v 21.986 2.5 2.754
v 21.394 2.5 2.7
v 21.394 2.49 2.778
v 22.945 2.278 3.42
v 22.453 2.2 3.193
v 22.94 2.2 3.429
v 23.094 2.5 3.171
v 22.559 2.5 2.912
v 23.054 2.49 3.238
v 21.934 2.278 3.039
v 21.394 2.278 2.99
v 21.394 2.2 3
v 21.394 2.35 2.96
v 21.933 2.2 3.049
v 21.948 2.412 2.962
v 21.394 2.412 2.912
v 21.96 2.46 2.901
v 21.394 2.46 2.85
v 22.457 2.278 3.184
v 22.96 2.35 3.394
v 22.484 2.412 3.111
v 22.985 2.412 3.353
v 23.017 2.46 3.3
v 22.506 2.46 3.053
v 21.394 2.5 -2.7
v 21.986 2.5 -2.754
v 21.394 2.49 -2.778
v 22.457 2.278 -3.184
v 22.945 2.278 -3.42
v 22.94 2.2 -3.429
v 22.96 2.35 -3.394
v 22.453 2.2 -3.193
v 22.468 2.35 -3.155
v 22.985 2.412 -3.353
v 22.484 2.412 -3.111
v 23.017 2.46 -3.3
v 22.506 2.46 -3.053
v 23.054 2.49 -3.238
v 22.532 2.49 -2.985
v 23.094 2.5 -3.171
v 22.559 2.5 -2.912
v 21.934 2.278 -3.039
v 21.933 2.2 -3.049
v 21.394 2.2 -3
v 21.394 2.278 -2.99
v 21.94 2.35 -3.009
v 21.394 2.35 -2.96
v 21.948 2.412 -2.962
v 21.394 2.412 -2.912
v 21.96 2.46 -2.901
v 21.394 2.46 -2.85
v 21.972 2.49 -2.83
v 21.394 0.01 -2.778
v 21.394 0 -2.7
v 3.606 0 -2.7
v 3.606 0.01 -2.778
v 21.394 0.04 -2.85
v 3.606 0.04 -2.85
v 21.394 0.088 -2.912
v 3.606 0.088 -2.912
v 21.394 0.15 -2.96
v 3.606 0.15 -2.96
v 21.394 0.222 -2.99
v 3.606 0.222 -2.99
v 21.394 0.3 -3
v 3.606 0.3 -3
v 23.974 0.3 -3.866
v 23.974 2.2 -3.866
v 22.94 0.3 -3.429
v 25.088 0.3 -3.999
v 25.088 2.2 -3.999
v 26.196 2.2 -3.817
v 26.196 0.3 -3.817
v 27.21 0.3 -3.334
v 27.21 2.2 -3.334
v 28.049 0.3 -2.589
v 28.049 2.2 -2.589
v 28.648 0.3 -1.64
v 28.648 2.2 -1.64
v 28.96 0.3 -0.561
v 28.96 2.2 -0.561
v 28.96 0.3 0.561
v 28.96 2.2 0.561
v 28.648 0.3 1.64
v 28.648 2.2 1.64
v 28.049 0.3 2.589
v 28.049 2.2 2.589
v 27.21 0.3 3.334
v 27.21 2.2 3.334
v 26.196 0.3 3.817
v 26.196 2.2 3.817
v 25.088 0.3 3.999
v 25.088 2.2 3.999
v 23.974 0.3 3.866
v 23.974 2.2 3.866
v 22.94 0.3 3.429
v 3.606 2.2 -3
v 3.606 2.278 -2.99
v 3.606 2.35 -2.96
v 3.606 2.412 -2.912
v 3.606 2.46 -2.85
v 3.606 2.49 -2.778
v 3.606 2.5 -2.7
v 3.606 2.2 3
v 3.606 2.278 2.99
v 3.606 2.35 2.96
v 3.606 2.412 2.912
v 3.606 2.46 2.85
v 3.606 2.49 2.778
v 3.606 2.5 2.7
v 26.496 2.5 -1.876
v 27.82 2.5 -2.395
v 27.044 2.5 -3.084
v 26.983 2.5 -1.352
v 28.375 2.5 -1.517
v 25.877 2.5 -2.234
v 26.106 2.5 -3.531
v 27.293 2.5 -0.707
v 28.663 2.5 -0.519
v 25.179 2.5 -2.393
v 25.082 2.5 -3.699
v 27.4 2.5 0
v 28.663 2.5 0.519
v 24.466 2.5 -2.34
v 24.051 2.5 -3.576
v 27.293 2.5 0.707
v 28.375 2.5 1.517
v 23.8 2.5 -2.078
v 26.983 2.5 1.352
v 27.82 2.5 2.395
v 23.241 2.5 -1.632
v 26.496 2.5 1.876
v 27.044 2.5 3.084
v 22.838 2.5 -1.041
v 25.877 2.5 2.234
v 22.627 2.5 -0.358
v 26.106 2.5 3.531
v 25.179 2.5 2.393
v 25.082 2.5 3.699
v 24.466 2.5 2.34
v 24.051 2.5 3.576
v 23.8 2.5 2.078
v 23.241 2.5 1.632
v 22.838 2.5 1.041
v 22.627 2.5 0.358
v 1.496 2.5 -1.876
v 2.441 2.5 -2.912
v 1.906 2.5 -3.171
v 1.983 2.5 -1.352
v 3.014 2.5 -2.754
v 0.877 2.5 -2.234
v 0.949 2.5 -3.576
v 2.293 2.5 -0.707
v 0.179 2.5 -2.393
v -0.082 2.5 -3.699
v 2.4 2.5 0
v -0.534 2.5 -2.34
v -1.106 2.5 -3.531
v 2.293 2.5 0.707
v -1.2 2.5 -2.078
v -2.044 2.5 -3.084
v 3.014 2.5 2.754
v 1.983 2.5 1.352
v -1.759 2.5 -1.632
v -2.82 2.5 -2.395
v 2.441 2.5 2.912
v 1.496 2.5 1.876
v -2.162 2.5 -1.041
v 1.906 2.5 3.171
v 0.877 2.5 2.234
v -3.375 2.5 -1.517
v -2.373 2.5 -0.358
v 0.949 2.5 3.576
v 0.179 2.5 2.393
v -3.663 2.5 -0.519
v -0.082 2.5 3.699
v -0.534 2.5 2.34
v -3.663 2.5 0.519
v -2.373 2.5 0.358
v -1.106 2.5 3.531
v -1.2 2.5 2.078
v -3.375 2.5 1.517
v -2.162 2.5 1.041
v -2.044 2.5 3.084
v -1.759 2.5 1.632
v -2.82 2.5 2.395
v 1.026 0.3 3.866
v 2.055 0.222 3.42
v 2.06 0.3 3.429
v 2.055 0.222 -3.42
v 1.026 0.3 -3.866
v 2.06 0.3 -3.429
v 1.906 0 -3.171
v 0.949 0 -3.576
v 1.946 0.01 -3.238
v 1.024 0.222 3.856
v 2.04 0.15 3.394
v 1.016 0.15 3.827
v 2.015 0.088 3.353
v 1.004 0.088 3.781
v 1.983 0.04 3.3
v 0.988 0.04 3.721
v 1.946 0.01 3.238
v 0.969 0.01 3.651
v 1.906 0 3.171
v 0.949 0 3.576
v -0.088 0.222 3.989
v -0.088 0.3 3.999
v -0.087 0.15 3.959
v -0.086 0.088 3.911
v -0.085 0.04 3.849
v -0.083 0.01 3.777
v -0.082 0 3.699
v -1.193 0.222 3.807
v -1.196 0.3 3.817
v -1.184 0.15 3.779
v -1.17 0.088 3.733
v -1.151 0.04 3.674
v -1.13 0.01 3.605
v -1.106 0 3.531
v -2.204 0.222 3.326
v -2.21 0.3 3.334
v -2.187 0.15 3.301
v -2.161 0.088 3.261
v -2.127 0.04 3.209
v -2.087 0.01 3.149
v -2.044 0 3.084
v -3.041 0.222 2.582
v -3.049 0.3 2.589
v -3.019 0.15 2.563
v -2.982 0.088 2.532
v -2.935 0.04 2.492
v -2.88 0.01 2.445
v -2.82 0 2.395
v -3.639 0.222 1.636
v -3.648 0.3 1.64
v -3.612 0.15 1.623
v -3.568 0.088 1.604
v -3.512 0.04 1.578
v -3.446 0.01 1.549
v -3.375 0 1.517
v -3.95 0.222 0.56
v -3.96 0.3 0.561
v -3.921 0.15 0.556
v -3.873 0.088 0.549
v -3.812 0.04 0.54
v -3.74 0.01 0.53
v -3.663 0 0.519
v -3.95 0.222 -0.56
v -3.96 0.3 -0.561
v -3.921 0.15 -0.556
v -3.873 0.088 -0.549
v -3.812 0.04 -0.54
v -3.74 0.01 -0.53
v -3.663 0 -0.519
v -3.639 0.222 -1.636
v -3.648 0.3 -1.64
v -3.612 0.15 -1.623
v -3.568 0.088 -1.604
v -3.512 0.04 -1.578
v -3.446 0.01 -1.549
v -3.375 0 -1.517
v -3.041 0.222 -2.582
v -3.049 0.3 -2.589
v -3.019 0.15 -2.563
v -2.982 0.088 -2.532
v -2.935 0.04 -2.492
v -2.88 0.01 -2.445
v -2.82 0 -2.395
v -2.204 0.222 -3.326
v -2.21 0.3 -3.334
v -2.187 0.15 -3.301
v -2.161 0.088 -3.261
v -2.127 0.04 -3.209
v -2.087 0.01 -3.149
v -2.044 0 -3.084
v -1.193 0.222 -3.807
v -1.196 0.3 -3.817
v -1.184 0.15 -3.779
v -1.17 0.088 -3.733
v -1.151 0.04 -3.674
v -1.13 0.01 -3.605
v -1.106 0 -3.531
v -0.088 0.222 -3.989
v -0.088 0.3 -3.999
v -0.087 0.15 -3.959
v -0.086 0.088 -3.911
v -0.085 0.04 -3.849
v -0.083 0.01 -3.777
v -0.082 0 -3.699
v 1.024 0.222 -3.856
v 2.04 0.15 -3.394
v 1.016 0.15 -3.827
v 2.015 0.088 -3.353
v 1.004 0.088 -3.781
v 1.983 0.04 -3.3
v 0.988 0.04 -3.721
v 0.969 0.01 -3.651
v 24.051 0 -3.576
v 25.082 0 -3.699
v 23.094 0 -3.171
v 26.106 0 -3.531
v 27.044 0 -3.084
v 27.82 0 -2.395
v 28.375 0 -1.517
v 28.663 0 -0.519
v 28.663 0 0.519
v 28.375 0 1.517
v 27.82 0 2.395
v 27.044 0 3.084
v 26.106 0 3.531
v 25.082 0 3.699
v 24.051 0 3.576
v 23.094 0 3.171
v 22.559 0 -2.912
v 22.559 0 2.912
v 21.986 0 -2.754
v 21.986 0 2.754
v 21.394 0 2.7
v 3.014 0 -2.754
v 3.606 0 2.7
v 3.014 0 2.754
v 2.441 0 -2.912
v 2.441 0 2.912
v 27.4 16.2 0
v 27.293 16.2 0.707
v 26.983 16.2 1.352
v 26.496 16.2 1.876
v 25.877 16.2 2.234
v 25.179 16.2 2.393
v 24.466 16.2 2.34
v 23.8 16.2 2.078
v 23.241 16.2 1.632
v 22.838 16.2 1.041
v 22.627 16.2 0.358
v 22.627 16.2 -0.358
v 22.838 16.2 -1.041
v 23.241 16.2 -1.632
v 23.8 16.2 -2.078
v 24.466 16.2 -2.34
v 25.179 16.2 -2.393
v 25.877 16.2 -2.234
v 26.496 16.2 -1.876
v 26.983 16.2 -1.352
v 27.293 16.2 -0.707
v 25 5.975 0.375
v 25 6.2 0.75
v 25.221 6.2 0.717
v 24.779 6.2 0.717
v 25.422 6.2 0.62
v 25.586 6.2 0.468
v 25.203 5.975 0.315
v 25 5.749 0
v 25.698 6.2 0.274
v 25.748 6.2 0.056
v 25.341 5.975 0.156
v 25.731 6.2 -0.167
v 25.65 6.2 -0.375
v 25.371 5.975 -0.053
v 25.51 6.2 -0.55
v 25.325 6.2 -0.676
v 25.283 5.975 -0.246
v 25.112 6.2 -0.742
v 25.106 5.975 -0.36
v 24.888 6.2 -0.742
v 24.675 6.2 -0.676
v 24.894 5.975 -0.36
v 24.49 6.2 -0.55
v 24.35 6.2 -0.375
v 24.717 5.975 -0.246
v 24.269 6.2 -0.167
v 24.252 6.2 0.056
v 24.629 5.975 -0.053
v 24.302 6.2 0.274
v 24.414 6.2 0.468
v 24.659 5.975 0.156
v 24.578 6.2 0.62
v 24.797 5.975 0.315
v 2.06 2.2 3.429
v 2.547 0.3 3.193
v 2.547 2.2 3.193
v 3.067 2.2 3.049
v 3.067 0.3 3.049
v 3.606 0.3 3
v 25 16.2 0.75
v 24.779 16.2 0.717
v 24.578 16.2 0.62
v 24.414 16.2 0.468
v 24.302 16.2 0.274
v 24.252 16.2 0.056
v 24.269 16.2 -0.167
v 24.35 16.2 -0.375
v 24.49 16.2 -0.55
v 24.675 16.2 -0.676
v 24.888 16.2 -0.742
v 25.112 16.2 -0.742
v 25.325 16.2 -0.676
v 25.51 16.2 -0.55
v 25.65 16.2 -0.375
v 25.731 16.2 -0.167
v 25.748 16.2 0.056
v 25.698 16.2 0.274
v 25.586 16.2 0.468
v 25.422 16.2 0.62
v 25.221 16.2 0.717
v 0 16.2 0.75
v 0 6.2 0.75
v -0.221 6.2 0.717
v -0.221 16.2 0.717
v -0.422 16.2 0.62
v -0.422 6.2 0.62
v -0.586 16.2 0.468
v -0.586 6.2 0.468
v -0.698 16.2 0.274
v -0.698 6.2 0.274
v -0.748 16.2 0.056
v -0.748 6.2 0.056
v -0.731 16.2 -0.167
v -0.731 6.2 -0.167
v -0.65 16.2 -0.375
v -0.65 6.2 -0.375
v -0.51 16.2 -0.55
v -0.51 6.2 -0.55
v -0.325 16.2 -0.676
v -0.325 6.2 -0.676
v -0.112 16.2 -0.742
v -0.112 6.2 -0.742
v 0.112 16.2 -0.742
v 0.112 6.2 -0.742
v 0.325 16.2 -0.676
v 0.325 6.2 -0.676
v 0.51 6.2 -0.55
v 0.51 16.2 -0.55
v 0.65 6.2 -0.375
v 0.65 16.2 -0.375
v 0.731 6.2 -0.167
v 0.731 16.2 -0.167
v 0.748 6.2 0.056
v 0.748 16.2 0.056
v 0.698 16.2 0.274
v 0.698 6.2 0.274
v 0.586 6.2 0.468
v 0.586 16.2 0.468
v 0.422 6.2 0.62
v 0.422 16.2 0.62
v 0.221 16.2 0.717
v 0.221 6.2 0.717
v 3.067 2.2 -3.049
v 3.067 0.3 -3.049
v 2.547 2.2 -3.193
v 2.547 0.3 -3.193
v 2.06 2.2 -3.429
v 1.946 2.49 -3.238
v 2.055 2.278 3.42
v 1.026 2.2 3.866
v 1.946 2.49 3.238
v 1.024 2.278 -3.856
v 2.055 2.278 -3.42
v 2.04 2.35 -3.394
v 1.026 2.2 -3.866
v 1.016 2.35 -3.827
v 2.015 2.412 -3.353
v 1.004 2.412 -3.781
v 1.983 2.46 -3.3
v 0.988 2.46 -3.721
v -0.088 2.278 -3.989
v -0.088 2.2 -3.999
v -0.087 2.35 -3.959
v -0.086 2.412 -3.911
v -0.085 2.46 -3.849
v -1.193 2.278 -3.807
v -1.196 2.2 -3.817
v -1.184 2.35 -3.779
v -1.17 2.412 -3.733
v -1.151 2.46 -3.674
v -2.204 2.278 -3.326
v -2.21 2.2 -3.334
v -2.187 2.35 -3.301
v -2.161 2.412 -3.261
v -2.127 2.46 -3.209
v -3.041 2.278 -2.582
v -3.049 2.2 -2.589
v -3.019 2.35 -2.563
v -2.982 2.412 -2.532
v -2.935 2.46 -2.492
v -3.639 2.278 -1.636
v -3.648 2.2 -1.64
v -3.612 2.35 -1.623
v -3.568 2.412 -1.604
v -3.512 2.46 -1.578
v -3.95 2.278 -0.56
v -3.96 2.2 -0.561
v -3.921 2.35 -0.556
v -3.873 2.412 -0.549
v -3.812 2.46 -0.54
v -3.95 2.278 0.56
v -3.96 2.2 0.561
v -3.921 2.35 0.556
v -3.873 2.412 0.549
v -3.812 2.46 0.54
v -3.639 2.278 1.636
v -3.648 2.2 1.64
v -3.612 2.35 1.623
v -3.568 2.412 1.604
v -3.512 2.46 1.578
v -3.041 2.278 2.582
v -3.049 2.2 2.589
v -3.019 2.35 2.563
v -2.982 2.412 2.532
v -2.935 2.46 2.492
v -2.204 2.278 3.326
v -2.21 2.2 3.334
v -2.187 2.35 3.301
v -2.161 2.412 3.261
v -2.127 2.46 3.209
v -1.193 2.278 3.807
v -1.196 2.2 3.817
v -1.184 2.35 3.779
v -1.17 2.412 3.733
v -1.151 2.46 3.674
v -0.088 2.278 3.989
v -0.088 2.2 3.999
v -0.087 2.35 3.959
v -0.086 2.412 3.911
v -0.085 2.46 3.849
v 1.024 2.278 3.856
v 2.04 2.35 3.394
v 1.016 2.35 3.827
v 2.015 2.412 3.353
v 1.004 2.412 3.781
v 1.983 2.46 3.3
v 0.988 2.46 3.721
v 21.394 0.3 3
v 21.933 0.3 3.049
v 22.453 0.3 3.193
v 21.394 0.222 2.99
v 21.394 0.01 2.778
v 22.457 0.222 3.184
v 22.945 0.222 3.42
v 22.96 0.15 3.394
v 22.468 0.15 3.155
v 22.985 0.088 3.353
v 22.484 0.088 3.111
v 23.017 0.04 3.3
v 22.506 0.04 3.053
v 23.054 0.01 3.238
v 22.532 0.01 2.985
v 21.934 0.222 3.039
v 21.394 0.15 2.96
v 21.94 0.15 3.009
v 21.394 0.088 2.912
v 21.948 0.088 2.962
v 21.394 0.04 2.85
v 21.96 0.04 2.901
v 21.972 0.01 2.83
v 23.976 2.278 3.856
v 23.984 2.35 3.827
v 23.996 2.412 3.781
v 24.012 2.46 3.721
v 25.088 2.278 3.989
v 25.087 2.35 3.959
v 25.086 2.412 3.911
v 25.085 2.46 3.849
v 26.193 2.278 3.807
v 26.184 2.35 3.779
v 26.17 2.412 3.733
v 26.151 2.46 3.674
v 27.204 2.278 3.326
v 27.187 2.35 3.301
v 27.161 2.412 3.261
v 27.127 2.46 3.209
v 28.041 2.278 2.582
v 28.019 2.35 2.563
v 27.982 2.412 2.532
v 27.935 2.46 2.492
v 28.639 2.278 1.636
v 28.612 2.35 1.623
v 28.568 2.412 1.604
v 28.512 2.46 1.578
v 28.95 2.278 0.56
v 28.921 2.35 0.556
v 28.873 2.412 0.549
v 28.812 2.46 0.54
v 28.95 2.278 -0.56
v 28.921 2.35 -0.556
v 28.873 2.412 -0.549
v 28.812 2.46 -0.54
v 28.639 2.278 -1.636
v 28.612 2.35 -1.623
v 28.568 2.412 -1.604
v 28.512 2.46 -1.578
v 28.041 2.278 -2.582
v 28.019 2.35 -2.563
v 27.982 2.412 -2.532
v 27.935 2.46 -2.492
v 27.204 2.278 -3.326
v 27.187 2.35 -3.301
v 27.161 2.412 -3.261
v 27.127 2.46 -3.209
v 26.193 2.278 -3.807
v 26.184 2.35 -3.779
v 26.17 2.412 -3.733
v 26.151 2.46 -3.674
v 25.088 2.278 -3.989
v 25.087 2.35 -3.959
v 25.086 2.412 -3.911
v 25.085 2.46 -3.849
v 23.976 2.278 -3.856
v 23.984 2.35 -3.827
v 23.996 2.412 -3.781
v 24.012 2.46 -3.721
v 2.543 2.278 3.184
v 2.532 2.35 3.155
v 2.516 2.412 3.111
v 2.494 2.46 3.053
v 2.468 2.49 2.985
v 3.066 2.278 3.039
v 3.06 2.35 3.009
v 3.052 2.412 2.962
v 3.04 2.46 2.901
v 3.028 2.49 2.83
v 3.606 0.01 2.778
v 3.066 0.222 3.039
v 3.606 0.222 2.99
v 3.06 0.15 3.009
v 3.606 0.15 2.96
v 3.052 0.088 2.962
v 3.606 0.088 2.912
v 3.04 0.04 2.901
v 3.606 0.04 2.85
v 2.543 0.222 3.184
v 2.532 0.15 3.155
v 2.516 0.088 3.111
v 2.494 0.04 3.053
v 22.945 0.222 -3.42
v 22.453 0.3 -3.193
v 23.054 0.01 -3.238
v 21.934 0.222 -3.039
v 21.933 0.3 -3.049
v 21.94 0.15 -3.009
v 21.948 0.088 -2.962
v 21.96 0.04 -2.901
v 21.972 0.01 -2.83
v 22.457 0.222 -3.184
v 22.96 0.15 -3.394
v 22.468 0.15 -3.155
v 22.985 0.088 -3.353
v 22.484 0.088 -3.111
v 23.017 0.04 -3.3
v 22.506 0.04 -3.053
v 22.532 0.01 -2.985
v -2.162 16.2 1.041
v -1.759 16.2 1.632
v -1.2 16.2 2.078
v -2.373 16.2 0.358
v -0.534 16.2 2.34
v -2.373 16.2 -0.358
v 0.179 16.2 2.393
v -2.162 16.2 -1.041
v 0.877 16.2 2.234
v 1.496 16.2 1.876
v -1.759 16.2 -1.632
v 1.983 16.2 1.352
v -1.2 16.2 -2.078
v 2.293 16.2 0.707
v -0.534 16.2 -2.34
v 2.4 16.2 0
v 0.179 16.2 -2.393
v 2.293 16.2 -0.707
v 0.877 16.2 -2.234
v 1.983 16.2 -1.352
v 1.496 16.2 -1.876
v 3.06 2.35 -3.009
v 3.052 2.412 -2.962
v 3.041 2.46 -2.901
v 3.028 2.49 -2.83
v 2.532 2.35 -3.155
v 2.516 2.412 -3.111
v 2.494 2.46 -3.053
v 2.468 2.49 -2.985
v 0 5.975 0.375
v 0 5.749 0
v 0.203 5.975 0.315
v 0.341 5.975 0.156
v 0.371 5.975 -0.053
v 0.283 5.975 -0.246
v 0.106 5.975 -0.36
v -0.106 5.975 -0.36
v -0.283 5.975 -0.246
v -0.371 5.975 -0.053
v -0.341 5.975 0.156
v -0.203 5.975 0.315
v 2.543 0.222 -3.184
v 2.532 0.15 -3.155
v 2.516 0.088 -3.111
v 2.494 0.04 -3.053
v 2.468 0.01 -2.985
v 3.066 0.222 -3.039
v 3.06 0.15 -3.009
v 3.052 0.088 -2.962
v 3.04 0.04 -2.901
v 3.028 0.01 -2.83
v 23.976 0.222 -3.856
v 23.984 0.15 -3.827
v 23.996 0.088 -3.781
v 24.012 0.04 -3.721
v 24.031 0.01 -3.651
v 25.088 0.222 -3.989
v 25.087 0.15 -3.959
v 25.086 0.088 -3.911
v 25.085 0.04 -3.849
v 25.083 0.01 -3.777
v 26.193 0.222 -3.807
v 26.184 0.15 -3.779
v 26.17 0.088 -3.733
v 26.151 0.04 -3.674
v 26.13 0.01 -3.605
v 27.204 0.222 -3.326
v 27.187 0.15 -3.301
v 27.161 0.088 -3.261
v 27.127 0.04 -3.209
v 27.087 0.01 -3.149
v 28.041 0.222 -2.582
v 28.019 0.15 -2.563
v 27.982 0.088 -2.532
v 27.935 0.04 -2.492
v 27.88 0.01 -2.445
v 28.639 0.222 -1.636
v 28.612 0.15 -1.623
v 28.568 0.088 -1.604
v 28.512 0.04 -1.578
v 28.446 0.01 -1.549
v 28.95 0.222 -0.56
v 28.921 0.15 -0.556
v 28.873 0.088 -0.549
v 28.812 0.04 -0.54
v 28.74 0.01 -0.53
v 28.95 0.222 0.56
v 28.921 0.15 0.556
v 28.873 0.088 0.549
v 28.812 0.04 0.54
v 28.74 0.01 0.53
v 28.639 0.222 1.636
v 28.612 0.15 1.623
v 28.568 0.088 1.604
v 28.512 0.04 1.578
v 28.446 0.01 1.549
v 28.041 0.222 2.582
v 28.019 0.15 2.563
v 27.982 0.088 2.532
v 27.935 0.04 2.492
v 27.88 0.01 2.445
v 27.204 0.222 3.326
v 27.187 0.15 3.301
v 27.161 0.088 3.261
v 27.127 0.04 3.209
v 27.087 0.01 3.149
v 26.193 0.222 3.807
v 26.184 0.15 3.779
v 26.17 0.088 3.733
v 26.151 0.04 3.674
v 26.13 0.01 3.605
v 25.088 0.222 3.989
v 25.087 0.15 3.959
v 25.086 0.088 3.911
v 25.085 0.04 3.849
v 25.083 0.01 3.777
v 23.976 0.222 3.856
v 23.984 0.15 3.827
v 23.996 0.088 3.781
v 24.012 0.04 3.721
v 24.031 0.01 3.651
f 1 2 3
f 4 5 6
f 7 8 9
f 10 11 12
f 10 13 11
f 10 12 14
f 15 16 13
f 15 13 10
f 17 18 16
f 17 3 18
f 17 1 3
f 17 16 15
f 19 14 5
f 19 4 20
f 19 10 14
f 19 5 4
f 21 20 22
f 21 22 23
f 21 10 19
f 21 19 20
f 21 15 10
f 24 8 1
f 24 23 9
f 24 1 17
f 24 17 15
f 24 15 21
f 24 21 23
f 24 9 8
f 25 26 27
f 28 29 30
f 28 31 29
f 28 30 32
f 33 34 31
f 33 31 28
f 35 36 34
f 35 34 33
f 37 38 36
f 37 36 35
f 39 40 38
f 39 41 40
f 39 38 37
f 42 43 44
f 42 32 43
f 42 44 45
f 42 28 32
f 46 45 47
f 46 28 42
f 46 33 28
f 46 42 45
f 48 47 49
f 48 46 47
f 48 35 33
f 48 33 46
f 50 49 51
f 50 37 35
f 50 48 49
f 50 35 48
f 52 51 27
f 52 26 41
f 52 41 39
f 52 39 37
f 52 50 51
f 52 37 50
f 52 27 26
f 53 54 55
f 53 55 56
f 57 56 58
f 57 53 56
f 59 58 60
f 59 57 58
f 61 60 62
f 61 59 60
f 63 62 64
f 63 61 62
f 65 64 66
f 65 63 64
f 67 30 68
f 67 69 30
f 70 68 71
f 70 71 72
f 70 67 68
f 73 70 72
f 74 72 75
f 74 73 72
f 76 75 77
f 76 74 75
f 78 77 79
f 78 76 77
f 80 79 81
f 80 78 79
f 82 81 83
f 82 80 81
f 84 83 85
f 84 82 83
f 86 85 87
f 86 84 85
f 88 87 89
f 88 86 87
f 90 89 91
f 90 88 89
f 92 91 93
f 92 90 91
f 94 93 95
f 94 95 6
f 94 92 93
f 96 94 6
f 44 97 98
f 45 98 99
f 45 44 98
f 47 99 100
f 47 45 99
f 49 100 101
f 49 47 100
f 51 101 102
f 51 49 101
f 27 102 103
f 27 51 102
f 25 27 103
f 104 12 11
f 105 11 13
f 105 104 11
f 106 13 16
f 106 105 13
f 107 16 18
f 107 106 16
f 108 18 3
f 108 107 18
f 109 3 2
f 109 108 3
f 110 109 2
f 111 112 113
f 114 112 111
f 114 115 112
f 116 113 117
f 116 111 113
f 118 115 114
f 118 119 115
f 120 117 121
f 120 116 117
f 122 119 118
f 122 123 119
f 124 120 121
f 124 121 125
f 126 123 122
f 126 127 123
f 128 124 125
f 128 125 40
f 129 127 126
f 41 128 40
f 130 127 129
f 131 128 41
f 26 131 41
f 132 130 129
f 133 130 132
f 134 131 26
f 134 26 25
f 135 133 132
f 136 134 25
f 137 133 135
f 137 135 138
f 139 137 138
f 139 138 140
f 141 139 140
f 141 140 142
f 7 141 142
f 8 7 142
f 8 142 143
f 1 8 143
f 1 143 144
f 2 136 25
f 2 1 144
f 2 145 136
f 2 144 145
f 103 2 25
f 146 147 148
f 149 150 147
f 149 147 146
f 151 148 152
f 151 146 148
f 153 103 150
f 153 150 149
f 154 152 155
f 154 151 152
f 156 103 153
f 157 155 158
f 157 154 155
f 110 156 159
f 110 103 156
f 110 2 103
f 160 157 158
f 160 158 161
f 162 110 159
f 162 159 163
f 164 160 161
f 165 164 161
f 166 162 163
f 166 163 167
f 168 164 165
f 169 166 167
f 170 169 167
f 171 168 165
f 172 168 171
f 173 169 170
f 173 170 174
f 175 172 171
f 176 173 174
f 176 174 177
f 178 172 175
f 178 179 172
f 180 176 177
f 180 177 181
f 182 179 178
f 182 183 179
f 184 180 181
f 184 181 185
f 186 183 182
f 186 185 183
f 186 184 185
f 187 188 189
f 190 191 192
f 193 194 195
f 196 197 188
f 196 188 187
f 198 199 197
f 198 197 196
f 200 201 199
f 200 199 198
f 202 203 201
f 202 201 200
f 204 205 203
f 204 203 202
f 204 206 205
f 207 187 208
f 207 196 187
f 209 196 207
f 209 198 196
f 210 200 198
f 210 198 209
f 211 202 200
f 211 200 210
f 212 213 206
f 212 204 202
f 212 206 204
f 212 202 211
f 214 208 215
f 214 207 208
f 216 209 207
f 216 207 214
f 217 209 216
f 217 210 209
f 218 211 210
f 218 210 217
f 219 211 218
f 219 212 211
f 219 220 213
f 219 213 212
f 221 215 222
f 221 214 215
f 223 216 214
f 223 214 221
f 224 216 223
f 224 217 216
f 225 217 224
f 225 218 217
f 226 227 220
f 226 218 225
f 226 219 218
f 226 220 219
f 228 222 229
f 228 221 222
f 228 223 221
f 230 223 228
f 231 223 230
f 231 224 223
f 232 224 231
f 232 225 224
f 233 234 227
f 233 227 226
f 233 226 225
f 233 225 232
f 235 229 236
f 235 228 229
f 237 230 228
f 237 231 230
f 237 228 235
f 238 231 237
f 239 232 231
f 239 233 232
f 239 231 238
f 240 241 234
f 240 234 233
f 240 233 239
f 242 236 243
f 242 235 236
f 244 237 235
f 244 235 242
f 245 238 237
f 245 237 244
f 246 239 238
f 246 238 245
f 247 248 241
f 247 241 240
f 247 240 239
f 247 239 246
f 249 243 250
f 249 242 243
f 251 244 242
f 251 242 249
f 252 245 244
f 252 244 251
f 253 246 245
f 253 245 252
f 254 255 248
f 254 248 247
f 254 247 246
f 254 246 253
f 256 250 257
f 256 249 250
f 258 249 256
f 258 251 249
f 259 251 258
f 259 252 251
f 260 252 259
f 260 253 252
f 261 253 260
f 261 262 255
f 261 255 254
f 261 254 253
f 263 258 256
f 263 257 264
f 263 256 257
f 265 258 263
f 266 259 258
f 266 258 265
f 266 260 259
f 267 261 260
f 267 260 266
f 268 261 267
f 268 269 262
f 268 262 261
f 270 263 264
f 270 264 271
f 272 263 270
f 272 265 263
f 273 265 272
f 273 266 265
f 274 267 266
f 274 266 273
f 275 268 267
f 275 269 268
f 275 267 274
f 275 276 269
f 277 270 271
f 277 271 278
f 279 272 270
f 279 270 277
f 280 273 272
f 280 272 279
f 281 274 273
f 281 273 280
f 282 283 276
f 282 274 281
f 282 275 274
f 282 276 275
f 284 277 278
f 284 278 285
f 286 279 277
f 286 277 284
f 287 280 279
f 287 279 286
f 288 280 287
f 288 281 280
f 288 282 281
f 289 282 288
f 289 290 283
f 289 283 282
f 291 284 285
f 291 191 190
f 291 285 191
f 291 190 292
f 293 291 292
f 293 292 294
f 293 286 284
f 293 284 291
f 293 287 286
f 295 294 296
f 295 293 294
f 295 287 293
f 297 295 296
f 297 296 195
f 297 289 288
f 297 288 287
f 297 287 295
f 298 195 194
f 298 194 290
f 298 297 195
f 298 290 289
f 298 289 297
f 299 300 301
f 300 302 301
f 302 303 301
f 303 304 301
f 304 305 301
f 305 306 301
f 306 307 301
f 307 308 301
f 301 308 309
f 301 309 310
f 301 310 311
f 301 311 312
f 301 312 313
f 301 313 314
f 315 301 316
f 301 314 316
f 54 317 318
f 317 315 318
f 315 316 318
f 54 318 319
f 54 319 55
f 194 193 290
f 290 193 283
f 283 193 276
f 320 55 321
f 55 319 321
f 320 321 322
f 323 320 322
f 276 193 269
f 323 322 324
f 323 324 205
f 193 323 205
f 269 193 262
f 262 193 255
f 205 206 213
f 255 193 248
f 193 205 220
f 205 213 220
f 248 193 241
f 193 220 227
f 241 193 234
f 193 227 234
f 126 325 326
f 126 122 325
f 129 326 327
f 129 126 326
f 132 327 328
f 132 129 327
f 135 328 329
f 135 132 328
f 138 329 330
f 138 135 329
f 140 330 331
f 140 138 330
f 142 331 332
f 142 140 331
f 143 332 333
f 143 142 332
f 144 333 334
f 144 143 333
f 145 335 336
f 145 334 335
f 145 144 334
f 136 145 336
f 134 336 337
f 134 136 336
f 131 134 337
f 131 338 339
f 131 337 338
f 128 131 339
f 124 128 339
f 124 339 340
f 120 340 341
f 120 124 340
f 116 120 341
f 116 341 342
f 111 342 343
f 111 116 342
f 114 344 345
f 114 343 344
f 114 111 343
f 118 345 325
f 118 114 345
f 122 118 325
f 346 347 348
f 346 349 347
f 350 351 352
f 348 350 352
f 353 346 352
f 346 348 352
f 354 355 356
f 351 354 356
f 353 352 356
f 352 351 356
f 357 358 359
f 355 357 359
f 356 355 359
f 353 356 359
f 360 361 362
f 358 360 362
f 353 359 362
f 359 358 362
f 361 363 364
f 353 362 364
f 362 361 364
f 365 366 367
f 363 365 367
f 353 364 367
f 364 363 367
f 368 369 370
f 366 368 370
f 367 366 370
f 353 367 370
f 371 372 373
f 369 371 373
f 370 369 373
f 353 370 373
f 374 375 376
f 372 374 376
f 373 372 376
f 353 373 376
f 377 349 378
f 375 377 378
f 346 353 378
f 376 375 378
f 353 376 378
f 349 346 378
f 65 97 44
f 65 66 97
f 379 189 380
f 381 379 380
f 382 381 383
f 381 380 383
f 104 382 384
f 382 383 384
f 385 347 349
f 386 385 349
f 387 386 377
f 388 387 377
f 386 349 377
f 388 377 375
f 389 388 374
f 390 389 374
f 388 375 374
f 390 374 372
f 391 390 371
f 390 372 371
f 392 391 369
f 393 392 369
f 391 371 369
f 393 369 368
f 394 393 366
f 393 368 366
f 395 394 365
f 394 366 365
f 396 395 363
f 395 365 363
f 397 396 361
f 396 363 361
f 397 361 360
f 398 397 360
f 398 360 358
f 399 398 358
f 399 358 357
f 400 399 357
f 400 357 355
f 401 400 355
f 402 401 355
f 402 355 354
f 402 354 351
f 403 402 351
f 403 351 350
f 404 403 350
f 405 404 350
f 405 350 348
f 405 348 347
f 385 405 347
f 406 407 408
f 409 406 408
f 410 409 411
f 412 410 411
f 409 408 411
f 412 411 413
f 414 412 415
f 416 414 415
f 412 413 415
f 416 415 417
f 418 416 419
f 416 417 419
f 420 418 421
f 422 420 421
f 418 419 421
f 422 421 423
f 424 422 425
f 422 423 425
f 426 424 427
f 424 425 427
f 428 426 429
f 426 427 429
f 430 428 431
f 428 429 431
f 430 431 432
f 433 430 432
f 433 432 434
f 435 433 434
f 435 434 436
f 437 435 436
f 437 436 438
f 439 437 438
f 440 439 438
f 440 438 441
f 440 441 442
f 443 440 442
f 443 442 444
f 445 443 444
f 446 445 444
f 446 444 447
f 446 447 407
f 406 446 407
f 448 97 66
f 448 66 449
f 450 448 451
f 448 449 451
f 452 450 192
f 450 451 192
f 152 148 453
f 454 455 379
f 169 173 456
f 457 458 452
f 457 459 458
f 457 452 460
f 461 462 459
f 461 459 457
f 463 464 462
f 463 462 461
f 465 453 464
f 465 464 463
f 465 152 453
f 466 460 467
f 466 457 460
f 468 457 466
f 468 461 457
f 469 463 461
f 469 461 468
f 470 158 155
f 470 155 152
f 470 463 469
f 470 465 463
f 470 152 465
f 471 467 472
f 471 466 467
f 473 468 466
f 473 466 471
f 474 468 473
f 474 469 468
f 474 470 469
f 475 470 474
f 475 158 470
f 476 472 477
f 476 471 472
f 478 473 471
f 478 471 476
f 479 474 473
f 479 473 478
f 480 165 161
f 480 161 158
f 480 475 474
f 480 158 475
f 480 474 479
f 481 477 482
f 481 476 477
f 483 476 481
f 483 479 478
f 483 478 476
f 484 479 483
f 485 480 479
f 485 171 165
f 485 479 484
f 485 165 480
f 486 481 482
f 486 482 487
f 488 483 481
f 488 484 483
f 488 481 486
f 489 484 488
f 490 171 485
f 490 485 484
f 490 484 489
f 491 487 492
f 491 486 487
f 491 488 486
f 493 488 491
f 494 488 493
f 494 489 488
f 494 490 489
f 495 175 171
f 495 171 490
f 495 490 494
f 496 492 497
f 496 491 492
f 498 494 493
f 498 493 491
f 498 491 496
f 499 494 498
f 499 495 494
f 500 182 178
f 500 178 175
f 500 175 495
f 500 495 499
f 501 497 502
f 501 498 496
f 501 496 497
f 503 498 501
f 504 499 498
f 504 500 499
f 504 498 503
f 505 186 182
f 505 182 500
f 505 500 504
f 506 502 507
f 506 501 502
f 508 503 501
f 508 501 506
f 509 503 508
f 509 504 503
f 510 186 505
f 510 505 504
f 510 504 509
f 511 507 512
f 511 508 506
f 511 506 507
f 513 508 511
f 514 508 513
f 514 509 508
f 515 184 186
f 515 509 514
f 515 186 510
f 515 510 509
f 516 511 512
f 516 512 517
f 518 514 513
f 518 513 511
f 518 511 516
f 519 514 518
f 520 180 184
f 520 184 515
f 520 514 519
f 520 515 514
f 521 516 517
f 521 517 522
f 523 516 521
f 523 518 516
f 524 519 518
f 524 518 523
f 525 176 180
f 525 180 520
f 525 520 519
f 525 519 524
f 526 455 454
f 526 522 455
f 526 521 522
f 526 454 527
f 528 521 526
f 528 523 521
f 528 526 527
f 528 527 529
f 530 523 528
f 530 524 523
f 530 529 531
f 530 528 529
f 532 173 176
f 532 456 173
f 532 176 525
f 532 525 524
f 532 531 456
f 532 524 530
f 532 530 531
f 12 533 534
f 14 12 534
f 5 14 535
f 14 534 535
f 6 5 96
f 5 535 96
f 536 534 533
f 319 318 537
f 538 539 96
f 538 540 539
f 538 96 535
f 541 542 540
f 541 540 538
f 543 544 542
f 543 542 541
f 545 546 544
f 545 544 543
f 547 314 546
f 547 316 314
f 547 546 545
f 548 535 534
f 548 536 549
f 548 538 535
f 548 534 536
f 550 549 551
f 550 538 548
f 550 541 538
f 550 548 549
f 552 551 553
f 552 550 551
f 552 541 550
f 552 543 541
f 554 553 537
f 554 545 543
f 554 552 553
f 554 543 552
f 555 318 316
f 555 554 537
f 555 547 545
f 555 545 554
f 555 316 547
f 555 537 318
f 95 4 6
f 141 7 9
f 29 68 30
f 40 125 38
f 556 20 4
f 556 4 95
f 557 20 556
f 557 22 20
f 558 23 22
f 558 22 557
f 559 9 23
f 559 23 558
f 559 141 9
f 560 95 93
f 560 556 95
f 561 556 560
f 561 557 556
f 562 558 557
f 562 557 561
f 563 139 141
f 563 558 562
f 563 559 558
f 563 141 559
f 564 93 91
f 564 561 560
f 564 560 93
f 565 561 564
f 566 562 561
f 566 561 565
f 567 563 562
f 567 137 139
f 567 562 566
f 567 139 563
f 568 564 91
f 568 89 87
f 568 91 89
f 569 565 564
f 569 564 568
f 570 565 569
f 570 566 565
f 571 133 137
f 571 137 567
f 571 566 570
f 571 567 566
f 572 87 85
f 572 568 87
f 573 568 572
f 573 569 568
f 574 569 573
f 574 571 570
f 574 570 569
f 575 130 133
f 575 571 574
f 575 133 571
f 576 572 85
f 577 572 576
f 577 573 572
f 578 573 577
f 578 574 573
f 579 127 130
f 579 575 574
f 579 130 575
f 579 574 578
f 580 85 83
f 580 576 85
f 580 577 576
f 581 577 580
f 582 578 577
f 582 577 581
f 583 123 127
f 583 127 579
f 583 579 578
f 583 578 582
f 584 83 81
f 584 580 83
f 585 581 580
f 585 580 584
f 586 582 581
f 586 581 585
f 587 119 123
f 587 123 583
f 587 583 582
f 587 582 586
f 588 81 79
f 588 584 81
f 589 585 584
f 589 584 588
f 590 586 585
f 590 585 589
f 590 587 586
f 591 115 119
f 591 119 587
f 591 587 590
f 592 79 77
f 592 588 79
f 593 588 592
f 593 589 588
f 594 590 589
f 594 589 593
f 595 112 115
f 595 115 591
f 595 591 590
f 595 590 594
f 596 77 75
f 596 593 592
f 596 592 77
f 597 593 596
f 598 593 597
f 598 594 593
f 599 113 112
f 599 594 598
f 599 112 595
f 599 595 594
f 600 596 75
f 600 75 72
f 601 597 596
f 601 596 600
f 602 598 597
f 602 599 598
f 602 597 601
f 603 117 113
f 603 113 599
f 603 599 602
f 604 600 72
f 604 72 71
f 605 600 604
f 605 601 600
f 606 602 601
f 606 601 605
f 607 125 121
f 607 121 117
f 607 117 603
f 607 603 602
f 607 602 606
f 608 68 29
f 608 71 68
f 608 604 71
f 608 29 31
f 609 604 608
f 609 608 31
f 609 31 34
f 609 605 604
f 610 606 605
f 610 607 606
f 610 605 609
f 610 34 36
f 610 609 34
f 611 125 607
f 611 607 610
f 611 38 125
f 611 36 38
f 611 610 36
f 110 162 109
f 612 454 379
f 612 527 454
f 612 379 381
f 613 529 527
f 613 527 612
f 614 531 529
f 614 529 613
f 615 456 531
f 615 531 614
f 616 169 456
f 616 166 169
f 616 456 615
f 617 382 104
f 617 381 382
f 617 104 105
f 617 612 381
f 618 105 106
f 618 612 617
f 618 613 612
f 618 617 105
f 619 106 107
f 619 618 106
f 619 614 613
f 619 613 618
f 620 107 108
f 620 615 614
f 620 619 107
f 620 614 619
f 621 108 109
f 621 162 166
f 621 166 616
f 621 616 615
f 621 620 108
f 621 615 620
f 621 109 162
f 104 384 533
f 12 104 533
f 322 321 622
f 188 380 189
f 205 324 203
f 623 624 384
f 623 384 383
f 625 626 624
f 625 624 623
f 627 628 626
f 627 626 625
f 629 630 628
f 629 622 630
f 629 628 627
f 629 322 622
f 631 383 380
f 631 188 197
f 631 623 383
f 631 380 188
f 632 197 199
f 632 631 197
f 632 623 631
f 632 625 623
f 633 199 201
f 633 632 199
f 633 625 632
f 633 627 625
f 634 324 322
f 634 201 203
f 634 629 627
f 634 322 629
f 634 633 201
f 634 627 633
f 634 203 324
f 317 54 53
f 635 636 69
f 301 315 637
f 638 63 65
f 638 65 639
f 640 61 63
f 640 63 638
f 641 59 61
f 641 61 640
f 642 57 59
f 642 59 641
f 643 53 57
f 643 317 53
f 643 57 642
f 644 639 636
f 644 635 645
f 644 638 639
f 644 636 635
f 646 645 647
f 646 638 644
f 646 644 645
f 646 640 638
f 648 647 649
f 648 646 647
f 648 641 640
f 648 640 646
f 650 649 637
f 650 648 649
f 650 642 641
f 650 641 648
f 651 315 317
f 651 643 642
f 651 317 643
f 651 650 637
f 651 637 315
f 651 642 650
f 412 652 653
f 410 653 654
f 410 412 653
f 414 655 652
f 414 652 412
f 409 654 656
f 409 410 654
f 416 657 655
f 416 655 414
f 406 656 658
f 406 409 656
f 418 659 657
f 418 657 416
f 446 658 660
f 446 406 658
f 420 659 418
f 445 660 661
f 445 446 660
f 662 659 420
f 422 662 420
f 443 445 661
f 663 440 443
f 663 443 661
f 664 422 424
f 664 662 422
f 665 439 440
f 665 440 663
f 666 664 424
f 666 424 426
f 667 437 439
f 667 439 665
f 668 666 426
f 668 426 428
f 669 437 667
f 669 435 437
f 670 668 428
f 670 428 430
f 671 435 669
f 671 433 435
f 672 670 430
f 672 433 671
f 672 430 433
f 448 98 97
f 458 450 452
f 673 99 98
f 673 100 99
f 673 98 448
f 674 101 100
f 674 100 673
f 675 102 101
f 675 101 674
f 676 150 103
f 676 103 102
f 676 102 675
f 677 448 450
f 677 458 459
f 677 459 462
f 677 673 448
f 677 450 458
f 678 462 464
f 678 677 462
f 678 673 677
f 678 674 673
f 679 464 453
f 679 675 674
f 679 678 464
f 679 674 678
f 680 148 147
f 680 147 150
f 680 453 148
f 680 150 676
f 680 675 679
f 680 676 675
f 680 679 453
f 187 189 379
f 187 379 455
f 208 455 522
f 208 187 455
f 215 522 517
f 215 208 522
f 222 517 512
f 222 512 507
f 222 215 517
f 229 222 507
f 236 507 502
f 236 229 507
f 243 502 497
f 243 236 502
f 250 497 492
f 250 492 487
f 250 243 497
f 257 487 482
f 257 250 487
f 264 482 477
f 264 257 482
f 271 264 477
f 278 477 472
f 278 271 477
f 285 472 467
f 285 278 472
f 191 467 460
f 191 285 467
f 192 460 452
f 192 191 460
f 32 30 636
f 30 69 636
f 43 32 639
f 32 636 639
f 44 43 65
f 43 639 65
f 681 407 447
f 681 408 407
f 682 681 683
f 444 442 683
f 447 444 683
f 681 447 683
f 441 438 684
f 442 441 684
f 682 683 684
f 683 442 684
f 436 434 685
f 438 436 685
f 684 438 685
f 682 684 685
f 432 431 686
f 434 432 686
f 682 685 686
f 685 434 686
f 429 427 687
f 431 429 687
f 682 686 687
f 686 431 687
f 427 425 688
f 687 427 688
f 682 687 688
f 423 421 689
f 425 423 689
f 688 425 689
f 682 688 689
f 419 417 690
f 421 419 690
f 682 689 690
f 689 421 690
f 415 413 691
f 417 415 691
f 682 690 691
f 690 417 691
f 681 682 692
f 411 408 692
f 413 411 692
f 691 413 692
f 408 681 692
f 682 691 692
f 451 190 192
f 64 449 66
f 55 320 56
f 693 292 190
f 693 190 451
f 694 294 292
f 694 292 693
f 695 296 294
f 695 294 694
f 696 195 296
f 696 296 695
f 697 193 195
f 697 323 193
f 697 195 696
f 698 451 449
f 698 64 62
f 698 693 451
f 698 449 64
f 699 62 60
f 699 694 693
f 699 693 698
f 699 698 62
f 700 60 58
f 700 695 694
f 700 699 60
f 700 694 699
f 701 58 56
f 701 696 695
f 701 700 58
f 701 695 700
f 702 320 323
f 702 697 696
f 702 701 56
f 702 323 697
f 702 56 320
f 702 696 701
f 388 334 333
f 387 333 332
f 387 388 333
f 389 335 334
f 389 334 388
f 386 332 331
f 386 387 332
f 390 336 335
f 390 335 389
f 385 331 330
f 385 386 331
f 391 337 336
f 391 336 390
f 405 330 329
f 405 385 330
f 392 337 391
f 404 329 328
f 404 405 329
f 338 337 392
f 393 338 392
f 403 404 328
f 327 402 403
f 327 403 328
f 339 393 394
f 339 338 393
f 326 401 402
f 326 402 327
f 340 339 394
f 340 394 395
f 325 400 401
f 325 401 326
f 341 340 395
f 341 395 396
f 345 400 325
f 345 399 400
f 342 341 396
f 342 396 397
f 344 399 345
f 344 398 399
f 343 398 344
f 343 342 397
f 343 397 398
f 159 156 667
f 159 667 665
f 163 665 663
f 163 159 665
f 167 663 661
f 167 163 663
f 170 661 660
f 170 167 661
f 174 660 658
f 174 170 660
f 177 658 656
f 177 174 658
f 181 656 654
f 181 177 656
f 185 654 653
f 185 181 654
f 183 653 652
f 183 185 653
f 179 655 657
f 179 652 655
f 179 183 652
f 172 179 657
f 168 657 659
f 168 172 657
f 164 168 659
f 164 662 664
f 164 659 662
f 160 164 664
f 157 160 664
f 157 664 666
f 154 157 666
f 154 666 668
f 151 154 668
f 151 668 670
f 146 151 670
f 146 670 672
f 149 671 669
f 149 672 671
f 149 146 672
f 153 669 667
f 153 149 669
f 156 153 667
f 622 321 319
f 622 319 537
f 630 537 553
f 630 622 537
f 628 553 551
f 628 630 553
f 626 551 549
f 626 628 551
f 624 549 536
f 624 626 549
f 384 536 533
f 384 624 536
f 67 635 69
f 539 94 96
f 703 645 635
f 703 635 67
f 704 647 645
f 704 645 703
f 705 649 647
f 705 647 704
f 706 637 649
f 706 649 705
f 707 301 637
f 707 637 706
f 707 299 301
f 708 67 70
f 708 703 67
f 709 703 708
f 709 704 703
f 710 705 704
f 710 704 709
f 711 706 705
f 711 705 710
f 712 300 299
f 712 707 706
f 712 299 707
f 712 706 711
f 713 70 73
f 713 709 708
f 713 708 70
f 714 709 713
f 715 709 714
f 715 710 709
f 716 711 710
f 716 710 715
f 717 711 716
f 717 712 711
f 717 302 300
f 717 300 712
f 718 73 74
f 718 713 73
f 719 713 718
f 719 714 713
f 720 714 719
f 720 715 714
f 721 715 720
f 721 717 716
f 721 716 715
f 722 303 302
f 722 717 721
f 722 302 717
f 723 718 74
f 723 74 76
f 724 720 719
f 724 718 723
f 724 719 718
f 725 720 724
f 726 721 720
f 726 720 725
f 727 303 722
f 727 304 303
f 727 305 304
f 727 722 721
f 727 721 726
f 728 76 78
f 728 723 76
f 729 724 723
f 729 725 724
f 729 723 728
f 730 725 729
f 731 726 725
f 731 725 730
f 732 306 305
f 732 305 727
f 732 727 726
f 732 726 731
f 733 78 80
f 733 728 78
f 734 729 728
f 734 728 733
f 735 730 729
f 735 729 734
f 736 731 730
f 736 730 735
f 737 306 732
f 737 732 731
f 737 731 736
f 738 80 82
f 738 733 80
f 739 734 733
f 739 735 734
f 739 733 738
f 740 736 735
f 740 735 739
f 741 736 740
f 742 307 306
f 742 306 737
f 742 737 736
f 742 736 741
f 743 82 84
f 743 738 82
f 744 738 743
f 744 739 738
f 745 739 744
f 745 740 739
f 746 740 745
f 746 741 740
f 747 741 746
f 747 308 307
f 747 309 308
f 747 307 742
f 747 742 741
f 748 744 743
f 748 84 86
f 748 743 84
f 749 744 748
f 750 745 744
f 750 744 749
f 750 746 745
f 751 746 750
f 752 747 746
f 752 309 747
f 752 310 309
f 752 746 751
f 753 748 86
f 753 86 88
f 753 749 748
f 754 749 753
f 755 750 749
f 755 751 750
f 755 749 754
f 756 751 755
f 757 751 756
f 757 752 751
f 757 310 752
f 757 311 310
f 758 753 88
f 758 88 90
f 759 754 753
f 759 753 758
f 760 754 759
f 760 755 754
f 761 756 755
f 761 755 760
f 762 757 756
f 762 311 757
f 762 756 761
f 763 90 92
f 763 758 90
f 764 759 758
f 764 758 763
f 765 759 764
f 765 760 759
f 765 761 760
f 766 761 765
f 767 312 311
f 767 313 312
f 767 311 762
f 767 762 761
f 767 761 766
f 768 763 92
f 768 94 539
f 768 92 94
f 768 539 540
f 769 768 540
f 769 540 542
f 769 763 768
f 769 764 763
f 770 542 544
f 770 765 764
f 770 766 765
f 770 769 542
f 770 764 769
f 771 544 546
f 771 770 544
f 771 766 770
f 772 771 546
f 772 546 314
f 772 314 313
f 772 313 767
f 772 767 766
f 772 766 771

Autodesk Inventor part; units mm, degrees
ref_plane "YZ Plane" through (0, 0, 0) normal (1, 0, 0) x (0, 1, 0)
ref_plane "XZ Plane" through (0, 0, 0) normal (0, 1, 0) x (-1, 0, 0)
ref_plane "XY Plane" through (0, 0, 0) normal (0, 0, 1) x (1, 0, 0)
sketch "Esboço1" plane through (0, 0, 0) normal (0, 1, 0) x (-1, 0, 0)
  arc A0 (-2.0603, -3.4286) -> (-2.0603, 3.4286) centre (0, 0) ccw
  arc A1 (-22.9397, 3.4286) -> (-22.9397, -3.4286) centre (-25, 0) ccw
  line L0 (-3.6056, -3) -> (-21.3944, -3)
  line L1 (-3.6056, 3) -> (-21.3944, 3)
  arc A2 (-2.0603, -3.4286) -> (-3.6056, -3) centre (-3.6056, -6) ccw
  arc A3 (-3.6056, 3) -> (-2.0603, 3.4286) centre (-3.6056, 6) ccw
  arc A4 (-21.3944, -3) -> (-22.9397, -3.4286) centre (-21.3944, -6) ccw
  arc A5 (-22.9397, 3.4286) -> (-21.3944, 3) centre (-21.3944, 6) ccw
  point P0 (-2.6458, -3)
  point P1 (-22.3542, -3)
  point P2 (-2.6458, 3)
  point P3 (-22.3542, 3)
  dimension "d3" = 6
  dimension "d5" = 3
  dimension "d11" = 25
  dimension "d13" = 4
extrude "Extrusão1" add sketch "Esboço1" along normal blind 2.5
fillet "Arredondamento1" radius 0.3 16 edges at (22.1962, 0, 3.1091) (29, 0, 0) (22.1962, 0, -3.1091) (12.5, 0, -3) (2.8038, 0, -3.1091) (-4, 0, 0) (2.8038, 0, 3.1091) (12.5, 0, 3) (22.1962, 2.5, 3.1091) (29, 2.5, 0) (22.1962, 2.5, -3.1091) (12.5, 2.5, -3) (2.8038, 2.5, -3.1091) (-4, 2.5, 0) (2.8038, 2.5, 3.1091) (12.5, 2.5, 3)
sketch "Esboço2" plane through (0, 2.5, 0) normal (0, 1, 0) x (1, 0, 0)
  circle A0 centre (0, 0) radius 2.4
  circle A1 centre (25, 0) radius 2.4
  arc A2 (23.0942, -3.1714) -> (23.0942, 3.1714) centre (25, 0) ccw projected
  dimension "d14" = 4.8
extrude "Extrusão2" add sketch "Esboço2" along normal blind 13.7
sketch "Esboço3" plane through (0, 16.2, 0) normal (0, 1, 0) x (1, 0, 0)
  circle A0 centre (0, 0) radius 2.4 projected
  circle A1 centre (25, 0) radius 2.4 projected
hole "Furo1" at (0, 16.2, 0) at (25, 16.2, 0) direction (0, -1, 0) diameter 1.5 depth 10 tip angle 118
properties part number "_3DPrint"
